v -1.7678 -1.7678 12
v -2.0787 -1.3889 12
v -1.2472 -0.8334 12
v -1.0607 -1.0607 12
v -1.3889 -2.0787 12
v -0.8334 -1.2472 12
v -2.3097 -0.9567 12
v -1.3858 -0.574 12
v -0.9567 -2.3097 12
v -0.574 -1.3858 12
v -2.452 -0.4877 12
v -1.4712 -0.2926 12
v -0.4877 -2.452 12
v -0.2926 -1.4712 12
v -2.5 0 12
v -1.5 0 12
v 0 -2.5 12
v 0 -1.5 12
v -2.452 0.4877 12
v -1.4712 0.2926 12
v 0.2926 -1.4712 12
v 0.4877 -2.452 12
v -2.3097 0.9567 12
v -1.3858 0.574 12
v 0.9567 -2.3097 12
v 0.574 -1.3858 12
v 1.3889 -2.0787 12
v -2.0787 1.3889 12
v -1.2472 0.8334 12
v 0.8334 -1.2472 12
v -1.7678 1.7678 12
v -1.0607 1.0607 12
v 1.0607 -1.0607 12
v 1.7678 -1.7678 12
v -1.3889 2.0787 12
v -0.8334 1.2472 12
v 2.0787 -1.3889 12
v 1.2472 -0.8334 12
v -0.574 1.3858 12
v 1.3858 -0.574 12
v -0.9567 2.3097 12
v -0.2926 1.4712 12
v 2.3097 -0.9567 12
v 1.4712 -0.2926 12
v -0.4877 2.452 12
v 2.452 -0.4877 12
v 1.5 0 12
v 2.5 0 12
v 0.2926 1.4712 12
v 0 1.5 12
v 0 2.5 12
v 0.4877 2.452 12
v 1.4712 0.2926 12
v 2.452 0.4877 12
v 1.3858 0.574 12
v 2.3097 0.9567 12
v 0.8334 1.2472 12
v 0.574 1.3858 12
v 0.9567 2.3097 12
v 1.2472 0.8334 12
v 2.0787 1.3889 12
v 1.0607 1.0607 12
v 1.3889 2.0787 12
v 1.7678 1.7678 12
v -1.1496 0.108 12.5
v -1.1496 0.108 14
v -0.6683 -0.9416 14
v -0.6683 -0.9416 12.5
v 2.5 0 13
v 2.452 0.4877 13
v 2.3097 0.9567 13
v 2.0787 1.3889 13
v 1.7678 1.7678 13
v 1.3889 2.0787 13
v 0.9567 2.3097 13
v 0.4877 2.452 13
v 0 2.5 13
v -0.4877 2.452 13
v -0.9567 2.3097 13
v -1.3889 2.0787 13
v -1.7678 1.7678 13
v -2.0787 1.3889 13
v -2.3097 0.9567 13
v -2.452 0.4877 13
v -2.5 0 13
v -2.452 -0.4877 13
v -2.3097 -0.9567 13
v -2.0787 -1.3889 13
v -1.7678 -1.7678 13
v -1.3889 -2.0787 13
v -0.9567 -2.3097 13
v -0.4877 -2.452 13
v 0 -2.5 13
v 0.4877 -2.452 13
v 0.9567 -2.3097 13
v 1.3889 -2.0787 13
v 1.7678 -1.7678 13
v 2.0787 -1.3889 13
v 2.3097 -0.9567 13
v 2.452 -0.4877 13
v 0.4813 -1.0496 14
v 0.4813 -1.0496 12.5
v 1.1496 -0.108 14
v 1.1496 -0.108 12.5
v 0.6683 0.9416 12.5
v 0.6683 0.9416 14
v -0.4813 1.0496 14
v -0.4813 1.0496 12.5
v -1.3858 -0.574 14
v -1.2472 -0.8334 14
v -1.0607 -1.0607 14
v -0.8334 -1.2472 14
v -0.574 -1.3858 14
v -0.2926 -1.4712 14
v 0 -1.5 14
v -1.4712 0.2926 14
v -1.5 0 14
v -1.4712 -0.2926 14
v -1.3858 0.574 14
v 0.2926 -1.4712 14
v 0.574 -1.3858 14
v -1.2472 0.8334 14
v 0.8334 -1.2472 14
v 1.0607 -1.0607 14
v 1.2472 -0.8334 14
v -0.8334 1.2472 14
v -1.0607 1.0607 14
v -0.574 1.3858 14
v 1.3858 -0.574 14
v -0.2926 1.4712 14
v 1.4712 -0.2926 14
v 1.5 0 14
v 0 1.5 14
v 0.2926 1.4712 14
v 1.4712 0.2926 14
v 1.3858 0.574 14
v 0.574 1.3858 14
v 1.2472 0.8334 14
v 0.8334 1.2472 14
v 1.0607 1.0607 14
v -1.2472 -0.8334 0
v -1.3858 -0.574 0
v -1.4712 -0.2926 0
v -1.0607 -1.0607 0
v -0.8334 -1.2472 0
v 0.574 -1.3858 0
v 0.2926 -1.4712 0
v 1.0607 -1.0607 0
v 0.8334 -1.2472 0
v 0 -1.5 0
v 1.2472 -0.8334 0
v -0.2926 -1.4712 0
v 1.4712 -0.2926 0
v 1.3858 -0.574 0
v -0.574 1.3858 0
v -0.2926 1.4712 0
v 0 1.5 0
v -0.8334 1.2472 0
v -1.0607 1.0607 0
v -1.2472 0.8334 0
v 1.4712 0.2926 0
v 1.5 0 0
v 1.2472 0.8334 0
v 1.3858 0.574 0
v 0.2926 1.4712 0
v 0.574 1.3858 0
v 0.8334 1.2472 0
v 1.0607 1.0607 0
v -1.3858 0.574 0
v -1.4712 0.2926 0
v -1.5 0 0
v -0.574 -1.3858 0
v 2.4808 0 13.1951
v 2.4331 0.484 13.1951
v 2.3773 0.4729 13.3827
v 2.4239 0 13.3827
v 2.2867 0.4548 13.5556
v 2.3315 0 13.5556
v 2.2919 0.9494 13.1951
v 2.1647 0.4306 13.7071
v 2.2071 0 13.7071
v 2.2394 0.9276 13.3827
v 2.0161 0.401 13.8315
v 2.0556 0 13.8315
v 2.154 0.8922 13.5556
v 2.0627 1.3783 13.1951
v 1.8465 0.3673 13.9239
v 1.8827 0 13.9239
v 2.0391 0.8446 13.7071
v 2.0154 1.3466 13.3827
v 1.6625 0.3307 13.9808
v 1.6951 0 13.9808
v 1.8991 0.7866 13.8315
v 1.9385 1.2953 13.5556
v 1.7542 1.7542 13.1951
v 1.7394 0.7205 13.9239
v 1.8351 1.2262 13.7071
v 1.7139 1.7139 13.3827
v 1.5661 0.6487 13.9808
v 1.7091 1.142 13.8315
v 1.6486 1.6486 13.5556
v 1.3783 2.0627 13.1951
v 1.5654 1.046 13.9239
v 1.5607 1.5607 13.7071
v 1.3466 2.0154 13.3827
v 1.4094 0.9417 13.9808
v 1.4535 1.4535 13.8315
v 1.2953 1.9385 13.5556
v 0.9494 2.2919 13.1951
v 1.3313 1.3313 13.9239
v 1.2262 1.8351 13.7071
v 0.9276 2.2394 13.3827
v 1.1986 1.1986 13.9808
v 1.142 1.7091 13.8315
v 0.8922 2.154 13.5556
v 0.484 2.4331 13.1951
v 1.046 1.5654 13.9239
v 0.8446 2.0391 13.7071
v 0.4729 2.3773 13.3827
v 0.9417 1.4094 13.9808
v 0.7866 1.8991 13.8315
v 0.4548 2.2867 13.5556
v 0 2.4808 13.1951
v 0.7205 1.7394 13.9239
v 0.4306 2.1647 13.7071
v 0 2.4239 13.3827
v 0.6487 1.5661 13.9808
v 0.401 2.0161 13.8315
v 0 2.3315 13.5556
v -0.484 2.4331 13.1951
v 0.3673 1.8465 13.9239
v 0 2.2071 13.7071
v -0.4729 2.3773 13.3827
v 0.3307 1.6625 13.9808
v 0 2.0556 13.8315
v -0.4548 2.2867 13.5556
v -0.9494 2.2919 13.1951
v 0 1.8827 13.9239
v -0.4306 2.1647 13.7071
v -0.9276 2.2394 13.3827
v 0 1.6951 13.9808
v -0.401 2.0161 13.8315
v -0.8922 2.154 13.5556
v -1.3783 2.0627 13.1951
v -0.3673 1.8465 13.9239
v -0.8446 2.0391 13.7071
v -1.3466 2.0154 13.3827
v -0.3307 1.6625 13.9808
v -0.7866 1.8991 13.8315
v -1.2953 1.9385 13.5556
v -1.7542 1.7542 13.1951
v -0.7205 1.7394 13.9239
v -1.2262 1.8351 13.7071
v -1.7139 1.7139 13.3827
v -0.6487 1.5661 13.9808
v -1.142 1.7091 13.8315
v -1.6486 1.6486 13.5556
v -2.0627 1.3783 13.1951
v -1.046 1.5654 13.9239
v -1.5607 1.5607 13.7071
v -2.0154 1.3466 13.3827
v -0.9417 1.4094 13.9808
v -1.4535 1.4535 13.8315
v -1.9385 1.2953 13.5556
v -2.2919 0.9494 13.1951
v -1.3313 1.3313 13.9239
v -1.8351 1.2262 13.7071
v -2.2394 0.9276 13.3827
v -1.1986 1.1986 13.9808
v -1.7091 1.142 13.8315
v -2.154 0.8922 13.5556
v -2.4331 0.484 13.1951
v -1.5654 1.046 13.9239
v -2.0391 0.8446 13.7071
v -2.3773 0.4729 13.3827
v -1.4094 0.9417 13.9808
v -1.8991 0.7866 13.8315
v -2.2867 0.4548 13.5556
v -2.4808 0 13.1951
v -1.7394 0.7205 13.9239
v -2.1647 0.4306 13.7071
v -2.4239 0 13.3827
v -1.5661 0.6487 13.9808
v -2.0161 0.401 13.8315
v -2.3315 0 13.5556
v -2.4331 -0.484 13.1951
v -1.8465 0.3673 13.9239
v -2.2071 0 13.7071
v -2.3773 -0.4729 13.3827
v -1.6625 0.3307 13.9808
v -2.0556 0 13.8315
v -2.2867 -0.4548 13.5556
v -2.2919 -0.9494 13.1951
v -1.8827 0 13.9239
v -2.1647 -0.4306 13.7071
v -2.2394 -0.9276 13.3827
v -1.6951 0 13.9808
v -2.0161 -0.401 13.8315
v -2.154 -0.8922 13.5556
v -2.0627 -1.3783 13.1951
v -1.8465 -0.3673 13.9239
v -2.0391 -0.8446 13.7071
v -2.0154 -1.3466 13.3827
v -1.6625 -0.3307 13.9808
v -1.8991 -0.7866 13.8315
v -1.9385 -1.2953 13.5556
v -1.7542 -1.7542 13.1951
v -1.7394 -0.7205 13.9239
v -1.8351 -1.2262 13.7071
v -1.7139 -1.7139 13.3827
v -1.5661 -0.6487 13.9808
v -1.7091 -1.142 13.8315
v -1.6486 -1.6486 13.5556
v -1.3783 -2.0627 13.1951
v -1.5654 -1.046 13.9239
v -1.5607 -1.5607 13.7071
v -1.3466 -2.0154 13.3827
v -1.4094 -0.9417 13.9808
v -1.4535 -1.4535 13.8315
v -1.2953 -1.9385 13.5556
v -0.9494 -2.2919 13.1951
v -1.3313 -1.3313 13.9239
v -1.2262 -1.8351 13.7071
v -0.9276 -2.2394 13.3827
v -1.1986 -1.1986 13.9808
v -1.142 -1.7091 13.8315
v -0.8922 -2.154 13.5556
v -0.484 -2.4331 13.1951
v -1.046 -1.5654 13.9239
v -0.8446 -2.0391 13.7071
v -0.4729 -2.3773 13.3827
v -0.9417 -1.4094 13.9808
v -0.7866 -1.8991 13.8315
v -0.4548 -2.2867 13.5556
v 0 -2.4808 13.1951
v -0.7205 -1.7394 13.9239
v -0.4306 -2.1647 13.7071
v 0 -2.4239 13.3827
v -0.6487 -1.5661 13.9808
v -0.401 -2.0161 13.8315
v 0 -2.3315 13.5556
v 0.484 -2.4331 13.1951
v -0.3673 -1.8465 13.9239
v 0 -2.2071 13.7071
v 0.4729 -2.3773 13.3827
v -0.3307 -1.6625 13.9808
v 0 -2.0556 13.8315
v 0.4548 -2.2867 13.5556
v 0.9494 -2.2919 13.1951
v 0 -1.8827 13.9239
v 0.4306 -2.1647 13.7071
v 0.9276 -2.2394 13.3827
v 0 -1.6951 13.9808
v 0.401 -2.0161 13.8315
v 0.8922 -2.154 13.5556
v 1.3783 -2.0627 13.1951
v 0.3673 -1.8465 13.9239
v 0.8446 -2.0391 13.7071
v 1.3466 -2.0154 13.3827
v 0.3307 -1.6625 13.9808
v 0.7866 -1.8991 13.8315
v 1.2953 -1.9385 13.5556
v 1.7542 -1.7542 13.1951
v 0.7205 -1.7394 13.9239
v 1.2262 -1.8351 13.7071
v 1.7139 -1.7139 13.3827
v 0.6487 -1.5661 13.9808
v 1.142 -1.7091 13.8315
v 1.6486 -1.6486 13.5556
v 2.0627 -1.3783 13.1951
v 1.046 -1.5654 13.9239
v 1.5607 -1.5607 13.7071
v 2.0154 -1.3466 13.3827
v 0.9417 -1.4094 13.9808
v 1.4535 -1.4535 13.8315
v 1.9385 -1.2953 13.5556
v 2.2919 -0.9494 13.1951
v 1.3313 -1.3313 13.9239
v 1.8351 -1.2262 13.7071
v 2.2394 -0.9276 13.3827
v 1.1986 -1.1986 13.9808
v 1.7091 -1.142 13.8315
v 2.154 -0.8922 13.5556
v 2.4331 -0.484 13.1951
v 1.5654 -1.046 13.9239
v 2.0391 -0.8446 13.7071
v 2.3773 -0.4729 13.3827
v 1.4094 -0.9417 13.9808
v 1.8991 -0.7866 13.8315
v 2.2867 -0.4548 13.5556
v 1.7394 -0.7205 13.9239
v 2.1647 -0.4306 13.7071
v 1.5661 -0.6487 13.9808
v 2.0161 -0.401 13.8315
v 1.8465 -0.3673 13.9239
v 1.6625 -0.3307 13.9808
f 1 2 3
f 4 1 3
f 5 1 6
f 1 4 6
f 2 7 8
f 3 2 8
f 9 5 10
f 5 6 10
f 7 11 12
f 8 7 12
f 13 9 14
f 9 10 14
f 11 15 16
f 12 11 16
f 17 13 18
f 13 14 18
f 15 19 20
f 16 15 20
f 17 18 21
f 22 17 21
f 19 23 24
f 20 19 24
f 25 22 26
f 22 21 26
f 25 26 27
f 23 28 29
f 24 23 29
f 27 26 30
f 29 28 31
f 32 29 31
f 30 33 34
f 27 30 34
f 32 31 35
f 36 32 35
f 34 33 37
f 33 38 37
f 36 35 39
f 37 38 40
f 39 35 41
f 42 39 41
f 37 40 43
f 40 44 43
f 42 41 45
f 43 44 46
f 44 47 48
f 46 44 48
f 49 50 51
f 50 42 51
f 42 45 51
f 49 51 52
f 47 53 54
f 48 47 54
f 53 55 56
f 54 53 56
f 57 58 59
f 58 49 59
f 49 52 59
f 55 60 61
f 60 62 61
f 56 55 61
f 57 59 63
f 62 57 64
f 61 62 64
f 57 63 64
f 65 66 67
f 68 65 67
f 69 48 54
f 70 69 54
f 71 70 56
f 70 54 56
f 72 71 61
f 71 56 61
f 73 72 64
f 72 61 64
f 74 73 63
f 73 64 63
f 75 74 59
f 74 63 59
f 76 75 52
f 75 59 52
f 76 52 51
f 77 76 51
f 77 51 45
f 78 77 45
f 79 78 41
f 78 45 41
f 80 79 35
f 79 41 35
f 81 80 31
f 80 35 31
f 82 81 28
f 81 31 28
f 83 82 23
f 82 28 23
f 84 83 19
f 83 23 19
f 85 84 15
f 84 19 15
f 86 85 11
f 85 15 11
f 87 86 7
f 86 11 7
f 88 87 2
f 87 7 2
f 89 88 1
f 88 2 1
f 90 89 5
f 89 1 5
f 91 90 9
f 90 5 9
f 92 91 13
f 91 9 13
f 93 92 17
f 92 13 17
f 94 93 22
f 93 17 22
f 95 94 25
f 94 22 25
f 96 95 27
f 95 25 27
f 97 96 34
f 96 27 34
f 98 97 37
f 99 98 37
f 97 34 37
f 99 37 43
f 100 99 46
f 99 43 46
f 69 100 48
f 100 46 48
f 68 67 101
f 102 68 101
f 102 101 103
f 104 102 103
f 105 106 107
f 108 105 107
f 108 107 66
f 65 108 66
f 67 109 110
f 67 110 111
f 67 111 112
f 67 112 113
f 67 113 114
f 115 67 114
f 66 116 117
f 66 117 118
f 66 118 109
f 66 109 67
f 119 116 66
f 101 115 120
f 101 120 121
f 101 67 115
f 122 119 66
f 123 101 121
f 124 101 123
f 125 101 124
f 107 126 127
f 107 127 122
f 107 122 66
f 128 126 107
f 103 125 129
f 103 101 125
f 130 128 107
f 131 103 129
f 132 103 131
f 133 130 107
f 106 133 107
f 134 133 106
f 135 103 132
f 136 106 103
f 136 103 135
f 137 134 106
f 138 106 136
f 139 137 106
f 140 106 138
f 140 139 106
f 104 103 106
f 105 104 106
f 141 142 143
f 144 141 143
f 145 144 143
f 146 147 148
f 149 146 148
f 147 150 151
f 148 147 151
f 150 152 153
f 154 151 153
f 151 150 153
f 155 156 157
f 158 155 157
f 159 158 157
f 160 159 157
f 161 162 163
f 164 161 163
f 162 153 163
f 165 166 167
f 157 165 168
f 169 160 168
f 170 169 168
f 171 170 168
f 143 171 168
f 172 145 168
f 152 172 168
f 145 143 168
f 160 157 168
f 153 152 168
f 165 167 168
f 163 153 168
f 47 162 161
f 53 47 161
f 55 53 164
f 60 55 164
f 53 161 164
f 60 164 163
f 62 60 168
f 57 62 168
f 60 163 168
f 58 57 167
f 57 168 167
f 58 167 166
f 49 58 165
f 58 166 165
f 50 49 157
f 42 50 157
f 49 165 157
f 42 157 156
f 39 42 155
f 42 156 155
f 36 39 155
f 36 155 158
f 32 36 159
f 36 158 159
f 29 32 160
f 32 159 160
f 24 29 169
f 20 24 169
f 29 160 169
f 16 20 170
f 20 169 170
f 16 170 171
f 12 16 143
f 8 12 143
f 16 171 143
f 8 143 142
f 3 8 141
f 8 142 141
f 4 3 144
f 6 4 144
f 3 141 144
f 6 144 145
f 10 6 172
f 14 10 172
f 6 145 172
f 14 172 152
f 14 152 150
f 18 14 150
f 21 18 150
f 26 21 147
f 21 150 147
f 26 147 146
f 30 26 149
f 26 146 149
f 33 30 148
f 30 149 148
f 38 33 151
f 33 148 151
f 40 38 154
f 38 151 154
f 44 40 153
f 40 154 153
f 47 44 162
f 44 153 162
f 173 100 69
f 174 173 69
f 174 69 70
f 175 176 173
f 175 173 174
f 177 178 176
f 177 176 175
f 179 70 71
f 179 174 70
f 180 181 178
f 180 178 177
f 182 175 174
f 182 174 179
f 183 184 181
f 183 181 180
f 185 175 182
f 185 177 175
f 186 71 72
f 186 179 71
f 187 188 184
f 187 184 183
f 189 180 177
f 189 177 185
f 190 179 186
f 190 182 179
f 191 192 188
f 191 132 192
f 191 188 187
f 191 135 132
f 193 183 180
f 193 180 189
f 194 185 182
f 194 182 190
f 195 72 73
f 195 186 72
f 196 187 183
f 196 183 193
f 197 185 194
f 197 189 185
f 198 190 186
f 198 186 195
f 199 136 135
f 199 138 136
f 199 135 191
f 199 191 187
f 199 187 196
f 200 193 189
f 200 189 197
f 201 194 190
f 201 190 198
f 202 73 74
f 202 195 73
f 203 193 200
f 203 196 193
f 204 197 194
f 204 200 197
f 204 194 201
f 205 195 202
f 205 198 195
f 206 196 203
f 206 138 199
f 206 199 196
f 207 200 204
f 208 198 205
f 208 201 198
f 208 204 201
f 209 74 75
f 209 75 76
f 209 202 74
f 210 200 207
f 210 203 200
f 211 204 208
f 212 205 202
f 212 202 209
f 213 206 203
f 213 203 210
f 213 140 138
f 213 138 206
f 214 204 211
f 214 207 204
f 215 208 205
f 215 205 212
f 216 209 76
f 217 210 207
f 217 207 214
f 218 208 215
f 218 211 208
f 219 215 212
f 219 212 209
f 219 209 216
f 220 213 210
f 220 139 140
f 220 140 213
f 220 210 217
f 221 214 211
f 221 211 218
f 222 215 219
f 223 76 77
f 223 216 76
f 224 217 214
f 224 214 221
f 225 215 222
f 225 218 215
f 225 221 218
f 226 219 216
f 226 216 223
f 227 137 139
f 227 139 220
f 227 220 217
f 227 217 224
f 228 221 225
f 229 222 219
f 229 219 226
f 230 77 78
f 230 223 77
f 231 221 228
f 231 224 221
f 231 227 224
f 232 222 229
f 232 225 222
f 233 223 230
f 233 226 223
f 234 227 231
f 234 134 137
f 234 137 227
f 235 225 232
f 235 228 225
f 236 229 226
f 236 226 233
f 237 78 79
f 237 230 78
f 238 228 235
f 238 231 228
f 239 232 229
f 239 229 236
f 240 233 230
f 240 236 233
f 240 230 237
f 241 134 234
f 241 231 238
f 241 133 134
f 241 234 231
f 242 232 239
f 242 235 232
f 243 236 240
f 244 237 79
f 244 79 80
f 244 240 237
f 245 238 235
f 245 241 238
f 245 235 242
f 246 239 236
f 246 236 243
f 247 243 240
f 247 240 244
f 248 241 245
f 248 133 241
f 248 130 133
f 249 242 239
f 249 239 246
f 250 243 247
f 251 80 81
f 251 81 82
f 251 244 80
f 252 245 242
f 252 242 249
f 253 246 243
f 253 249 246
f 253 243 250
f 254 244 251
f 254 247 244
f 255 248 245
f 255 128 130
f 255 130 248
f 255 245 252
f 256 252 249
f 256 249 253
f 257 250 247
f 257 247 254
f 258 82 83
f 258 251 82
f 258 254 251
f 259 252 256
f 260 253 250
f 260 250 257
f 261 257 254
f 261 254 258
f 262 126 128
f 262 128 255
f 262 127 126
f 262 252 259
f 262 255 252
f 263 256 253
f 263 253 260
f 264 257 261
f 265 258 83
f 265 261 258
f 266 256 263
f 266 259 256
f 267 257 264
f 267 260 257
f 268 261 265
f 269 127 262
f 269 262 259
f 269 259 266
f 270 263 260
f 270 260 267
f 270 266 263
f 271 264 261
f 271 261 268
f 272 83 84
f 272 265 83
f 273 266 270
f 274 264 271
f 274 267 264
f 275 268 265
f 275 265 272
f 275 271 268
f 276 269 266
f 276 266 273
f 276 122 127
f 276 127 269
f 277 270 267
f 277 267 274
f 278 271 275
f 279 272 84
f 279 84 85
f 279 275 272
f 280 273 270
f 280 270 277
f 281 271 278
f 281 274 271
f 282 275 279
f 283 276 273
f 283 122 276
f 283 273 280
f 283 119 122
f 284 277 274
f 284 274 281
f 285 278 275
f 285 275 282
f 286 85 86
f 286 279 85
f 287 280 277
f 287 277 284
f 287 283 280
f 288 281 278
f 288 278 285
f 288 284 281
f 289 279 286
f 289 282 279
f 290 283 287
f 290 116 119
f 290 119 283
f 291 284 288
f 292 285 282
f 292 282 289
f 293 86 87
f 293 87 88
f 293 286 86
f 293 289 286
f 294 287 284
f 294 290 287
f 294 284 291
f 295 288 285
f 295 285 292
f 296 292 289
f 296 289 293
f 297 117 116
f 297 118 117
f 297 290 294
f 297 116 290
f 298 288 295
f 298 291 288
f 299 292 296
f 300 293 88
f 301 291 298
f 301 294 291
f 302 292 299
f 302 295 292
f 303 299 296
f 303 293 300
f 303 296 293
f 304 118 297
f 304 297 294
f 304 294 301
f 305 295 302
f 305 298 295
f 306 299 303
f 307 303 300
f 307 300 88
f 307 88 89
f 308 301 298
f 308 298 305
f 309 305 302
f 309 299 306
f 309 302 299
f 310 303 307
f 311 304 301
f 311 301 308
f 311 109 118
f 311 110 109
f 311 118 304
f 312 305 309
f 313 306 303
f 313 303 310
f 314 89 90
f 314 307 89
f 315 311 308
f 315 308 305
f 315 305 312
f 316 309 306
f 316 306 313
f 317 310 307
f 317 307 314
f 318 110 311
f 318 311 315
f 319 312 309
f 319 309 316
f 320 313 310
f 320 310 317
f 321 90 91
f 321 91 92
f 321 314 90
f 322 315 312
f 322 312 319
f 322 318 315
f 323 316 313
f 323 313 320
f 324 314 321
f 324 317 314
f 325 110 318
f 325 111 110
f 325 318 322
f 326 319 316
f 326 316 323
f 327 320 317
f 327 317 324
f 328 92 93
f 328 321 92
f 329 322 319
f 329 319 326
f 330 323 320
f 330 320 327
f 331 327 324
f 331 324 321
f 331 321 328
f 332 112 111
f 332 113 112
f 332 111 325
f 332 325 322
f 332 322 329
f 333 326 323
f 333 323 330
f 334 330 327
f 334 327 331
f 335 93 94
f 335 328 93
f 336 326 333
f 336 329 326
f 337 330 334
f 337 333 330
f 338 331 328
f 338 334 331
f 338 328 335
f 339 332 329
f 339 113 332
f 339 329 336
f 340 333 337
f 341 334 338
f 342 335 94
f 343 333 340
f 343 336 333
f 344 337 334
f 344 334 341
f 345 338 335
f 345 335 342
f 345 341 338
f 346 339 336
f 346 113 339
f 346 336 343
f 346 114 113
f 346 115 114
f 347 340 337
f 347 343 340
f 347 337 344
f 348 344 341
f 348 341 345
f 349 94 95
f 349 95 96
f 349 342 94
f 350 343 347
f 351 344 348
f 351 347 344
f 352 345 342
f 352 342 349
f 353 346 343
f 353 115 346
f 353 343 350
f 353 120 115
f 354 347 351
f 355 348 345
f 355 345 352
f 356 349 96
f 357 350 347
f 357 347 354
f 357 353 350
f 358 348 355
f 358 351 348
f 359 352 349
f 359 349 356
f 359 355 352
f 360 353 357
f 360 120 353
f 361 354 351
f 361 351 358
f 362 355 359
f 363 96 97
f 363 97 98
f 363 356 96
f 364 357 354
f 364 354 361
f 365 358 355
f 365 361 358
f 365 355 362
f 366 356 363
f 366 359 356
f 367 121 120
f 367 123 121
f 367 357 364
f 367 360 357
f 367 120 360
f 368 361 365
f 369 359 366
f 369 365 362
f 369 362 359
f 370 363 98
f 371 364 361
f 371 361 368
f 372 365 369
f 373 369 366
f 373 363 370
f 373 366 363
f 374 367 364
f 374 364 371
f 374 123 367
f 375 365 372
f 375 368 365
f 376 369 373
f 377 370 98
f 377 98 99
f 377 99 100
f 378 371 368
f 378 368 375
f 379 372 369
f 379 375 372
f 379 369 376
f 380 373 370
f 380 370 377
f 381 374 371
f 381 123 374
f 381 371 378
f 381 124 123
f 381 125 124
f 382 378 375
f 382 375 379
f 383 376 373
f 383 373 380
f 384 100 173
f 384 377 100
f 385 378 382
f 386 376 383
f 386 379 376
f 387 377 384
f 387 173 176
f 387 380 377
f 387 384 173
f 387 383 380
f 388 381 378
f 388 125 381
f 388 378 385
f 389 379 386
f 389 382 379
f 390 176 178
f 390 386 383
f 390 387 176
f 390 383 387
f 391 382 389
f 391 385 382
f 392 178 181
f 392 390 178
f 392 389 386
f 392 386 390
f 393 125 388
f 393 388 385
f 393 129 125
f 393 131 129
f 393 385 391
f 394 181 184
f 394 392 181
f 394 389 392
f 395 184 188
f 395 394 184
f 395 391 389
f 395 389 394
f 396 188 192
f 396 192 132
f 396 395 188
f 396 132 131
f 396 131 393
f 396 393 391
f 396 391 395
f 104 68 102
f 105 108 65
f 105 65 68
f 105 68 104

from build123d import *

# Parameters (mm, degrees)
SKETCH_1_R          = 1.5
EXTRUDE_1_DEPTH     = 12
SKETCH_2_R          = 2.5
EXTRUDE_2_DEPTH     = 2
CUT_EXTRUDE_1_DEPTH = 1.5
FILLET_2_R          = 1


with BuildPart() as part:
    # 草图1 → 凸台-拉伸1 (new body)
    with BuildSketch(Plane.XY):
        Circle(SKETCH_1_R)
    extrude(amount=EXTRUDE_1_DEPTH)

    # 草图2 → 凸台-拉伸2 (add)
    with BuildSketch(Plane.XY.offset(12)):
        Circle(SKETCH_2_R)
    extrude(amount=EXTRUDE_2_DEPTH)

    # 草图3 → 切除-拉伸1 (cut)
    with BuildSketch(Plane.XY.offset(14)):
        Polygon((1.149641735, -0.107968584), (0.668324404, 0.941634655), (-0.481317331, 1.04960324), (-1.149641735, 0.107968584), (-0.668324404, -0.941634655), (0.481317331, -1.04960324), align=None)
    extrude(amount=-CUT_EXTRUDE_1_DEPTH, mode=Mode.SUBTRACT)

    # 圆角2
    fillet_2_edges = [part.edges().sort_by_distance(p)[0] for p in [
        (-2.5, 0, 14),
    ]]
    fillet(fillet_2_edges, radius=FILLET_2_R)


solid = part.part
